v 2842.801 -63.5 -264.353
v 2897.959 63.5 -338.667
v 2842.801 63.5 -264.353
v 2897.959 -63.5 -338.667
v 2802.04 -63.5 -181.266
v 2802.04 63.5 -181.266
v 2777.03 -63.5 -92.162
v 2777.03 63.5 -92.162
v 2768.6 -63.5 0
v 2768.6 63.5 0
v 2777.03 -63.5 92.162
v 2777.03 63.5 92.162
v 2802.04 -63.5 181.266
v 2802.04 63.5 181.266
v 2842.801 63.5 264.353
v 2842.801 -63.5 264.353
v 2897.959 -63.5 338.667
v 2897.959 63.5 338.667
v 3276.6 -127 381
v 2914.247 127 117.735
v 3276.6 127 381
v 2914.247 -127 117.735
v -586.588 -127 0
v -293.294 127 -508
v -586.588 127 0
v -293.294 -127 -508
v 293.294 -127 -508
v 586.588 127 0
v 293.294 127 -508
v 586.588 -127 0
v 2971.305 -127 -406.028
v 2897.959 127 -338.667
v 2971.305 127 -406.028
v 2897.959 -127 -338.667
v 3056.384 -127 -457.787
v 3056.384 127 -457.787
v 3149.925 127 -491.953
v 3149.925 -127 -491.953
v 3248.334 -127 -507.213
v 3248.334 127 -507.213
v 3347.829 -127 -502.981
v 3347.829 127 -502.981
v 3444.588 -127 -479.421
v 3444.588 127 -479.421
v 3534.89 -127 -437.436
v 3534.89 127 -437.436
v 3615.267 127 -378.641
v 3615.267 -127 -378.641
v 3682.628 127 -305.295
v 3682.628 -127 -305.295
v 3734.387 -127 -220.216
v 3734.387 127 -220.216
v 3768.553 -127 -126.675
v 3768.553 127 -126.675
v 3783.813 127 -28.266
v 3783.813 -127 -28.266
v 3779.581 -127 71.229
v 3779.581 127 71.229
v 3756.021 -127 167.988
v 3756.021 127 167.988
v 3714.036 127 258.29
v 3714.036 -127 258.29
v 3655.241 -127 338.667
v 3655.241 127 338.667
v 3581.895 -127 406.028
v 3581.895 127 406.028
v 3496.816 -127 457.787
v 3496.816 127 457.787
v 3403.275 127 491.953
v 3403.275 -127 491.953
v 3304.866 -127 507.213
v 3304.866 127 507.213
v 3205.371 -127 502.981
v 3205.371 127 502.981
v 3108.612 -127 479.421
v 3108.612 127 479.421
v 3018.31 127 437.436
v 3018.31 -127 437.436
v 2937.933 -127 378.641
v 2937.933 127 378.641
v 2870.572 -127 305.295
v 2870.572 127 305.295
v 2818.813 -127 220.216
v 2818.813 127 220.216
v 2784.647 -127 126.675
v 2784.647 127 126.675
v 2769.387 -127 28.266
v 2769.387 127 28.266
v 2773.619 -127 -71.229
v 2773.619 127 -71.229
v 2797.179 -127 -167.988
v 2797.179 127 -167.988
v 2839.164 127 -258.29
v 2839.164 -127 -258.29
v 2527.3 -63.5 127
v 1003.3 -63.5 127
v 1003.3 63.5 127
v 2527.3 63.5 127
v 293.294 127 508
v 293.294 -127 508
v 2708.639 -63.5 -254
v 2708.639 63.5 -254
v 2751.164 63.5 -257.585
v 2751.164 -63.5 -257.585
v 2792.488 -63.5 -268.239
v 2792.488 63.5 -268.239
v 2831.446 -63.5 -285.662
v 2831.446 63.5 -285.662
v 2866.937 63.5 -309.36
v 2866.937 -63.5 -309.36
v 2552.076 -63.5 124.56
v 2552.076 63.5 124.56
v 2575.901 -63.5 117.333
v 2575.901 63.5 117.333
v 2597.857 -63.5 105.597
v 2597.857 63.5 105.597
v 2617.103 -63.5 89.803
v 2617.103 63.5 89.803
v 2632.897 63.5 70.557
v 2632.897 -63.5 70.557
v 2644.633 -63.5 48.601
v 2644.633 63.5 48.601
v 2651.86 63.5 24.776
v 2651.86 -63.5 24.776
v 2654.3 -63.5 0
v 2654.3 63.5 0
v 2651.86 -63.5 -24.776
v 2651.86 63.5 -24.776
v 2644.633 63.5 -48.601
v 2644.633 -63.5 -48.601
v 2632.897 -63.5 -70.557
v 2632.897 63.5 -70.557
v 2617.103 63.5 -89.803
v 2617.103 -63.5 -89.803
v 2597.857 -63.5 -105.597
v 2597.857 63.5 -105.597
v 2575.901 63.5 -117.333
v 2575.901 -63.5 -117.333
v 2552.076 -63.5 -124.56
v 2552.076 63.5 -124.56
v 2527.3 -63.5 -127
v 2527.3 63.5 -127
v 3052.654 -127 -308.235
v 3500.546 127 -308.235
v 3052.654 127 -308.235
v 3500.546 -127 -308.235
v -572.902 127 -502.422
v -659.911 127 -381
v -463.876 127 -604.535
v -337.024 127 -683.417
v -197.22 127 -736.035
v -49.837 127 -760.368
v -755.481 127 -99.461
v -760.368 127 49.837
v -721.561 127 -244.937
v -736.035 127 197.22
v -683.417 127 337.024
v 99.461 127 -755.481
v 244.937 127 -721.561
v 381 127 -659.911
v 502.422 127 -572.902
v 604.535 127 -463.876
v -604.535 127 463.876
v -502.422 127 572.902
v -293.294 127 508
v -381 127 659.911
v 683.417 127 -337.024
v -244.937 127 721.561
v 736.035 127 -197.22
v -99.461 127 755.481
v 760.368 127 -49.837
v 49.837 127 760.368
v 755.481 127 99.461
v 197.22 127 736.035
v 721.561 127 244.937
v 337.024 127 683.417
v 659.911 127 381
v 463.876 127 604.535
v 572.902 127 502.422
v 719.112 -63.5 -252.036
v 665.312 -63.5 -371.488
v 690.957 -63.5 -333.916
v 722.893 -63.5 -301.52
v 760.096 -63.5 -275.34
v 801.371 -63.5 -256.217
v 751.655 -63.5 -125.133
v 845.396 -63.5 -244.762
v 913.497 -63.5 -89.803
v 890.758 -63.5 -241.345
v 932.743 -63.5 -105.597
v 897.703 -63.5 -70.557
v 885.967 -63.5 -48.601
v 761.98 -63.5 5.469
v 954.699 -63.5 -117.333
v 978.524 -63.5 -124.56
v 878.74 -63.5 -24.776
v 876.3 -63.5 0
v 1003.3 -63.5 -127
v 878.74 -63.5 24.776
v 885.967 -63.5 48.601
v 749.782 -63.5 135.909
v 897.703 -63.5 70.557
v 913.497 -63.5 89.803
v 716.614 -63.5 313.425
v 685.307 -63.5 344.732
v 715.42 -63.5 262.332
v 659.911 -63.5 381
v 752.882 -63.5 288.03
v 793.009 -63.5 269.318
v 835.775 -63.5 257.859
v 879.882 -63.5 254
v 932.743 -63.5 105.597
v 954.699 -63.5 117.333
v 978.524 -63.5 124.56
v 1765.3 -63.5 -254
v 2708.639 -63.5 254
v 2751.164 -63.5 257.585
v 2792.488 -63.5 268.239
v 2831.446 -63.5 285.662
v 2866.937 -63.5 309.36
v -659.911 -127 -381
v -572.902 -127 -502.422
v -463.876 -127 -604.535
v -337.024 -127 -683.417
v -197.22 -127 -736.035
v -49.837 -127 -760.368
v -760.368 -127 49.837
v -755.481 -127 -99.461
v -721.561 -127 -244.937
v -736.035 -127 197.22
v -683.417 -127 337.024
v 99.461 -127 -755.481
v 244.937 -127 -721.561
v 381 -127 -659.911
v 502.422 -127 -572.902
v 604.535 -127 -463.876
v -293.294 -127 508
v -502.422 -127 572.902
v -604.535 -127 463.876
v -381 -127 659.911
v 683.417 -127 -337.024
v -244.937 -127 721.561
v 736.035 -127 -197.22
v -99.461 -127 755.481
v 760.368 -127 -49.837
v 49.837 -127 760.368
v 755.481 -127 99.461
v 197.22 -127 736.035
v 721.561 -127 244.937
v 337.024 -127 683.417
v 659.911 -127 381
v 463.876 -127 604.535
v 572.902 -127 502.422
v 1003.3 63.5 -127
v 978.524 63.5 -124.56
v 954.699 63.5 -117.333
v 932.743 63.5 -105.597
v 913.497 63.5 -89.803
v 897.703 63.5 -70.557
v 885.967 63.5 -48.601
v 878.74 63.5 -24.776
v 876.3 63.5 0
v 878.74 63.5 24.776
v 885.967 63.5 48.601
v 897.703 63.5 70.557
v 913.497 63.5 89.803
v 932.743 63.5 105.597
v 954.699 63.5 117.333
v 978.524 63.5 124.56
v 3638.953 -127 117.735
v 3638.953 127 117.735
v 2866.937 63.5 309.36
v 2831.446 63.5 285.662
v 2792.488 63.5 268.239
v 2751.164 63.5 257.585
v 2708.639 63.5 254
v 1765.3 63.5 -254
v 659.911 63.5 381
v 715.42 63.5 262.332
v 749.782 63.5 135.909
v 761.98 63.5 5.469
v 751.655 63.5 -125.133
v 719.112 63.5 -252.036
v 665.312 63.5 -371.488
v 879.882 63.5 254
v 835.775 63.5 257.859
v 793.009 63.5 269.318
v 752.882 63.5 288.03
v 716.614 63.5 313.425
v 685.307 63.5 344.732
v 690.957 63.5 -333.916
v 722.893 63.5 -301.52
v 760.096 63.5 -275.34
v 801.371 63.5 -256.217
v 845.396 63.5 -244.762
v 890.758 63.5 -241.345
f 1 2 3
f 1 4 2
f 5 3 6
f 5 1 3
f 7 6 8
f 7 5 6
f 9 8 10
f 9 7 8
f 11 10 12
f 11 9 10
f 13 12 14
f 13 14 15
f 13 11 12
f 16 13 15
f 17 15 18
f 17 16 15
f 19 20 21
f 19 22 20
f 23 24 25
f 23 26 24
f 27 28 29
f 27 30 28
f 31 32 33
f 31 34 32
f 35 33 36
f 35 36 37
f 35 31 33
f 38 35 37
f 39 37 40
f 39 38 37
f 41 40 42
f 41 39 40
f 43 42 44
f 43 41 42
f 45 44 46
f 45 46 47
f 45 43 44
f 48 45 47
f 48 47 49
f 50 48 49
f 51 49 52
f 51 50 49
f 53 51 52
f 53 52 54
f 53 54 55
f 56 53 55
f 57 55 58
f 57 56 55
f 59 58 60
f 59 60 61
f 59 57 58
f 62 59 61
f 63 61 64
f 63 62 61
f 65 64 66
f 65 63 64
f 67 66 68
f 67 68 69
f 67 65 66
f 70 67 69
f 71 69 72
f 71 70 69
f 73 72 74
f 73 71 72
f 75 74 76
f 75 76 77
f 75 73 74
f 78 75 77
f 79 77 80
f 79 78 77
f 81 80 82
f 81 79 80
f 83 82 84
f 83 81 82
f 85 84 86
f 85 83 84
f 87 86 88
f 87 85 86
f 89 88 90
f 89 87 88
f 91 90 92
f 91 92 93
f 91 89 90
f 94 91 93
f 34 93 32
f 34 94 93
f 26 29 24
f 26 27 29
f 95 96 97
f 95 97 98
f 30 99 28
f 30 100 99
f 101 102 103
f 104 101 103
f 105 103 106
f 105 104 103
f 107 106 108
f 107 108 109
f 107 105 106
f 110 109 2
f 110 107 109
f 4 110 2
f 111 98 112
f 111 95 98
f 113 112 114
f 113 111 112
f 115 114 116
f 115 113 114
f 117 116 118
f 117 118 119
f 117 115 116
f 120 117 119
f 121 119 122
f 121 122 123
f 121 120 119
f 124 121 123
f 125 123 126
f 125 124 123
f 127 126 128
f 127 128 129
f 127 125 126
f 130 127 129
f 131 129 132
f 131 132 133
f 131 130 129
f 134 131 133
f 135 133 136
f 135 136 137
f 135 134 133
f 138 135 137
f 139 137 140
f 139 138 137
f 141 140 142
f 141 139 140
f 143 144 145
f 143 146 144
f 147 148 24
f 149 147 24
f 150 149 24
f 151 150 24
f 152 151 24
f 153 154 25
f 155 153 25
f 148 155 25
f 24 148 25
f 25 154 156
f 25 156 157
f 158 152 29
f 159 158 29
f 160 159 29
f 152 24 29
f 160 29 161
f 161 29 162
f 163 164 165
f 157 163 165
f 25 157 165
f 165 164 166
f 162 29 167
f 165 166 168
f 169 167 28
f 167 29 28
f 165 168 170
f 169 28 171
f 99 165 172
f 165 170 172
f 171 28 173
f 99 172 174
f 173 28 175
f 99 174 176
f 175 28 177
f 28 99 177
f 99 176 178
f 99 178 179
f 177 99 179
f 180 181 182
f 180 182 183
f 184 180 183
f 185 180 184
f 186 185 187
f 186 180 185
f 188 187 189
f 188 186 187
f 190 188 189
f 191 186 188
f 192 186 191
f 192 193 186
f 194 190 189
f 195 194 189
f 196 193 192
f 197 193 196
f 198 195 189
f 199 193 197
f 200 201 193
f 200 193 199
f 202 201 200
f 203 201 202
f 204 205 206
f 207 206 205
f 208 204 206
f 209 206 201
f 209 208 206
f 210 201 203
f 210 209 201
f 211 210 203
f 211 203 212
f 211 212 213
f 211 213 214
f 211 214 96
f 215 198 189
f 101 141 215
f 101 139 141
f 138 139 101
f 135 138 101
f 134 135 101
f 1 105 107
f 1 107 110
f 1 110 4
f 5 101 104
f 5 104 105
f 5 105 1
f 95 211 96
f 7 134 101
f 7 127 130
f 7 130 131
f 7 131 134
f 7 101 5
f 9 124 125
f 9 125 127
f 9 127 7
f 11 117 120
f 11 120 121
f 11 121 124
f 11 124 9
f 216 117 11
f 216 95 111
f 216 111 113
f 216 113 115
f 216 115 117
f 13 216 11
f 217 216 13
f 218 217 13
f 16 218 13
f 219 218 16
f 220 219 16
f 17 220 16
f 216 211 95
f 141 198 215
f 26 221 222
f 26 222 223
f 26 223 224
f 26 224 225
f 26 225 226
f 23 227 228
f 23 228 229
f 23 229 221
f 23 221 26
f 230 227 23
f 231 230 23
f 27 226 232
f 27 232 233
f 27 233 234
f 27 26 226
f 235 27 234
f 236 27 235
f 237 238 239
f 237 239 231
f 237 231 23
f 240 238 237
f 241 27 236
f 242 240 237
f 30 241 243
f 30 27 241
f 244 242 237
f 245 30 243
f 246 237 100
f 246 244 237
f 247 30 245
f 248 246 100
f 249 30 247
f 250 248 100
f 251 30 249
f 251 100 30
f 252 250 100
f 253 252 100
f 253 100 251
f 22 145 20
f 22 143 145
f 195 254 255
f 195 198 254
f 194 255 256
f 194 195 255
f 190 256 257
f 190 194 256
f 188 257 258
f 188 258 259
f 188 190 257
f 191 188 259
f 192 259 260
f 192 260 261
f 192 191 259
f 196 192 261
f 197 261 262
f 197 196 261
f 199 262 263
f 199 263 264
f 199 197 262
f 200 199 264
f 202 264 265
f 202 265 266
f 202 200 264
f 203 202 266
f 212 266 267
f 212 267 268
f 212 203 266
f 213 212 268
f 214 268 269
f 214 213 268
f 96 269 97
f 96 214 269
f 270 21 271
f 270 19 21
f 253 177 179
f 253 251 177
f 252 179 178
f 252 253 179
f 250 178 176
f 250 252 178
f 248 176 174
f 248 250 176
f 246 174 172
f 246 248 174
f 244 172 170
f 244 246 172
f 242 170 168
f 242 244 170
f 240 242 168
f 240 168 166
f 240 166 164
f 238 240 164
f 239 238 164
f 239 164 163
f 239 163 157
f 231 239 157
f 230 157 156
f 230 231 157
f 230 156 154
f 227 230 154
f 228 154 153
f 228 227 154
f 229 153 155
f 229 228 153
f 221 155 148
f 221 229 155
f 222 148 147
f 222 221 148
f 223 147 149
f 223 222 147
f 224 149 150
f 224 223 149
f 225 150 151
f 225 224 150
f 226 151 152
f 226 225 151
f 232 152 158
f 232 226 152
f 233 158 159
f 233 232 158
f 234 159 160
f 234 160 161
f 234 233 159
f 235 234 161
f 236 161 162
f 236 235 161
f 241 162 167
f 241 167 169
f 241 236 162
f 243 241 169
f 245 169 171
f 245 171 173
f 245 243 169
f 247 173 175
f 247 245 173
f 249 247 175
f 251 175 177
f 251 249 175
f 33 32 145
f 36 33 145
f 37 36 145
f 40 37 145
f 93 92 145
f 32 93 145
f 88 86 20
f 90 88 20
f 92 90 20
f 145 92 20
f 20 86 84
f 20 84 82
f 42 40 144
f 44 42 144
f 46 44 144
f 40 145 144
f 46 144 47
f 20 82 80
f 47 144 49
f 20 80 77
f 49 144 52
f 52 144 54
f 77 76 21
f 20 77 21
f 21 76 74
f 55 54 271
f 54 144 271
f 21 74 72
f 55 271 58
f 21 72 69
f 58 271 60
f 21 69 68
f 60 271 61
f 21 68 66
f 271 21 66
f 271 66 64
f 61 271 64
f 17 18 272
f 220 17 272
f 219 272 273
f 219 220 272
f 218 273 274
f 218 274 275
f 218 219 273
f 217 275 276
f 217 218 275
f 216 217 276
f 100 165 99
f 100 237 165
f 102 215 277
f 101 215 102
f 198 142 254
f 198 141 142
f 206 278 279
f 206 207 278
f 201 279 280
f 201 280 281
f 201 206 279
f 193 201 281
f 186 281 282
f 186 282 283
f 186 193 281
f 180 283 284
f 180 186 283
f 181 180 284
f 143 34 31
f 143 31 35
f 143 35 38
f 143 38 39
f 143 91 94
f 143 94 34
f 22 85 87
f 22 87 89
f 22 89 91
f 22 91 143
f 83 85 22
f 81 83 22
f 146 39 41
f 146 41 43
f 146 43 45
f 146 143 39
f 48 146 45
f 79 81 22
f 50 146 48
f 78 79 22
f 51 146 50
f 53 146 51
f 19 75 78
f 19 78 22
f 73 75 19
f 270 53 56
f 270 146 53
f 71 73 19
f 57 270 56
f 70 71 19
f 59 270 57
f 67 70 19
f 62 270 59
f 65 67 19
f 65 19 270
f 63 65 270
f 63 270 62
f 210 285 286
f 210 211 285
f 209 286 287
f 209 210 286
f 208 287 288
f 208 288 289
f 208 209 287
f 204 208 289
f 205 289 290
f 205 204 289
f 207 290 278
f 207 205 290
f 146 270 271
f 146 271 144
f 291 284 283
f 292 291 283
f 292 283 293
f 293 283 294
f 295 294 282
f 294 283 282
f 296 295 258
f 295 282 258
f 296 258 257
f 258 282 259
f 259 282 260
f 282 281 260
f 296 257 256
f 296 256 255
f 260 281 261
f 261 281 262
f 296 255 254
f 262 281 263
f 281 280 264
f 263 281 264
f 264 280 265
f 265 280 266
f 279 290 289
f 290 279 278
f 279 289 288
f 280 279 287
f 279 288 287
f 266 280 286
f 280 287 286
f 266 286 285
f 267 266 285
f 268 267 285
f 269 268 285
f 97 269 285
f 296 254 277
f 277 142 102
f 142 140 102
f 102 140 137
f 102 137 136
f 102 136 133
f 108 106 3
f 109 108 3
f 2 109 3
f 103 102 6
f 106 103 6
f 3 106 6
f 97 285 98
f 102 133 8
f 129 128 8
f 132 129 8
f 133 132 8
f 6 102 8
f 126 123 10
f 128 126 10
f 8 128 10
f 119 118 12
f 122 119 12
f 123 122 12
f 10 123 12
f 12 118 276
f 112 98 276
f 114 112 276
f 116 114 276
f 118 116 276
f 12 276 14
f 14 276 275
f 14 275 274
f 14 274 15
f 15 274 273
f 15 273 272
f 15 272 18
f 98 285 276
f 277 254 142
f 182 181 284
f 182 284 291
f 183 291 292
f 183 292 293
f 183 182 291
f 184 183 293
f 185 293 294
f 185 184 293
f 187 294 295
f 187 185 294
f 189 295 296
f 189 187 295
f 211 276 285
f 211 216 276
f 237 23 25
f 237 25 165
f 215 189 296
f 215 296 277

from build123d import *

# Parameters (mm, degrees)
F1_DEPTH = 127
F2_DEPTH = 63.5


with BuildPart() as f1:
    # F0 (on Front) → F1 (new body, symmetric)
    with BuildSketch(Plane.XZ):
        with BuildLine():
            ThreePointArc((665.3121861086, -371.4884857105), (737.4319920558, -191.932428455), (762, 0))
            ThreePointArc((762, 0), (736.0354796323, 197.2201123681), (659.9113576837, 381))
            ThreePointArc((659.9113576837, 381), (-761.9803741154, -5.4689544648), (665.3121861086, -371.4884857105))
        make_face()
        Polygon((-586.5878734967, 0), (-293.2939367483, 508), (293.2939367483, 508), (586.5878734967, 0), (293.2939367483, -508), (-293.2939367483, -508), align=None, mode=Mode.SUBTRACT)
    extrude(amount=F1_DEPTH, both=True)


with BuildPart() as f1b:
    # F0 (on Front) → F1, piece 2 (new body, symmetric)
    with BuildSketch(Plane.XZ):
        with BuildLine():
            ThreePointArc((3784.6, 0), (3457.8656216047, 474.5595583531), (2897.95915581, 338.6666666667))
            ThreePointArc((2897.95915581, 338.6666666667), (2768.6, 0), (2897.95915581, -338.6666666667))
            ThreePointArc((2897.95915581, -338.6666666667), (3457.8656216047, -474.5595583531), (3784.6, 0))
        make_face()
        Polygon((3638.9525327085, 117.7354748569), (3500.5461811234, -308.2354748569), (3052.6538188766, -308.2354748569), (2914.2474672915, 117.7354748569), (3276.6, 381), align=None, mode=Mode.SUBTRACT)
    extrude(amount=F1_DEPTH, both=True)


with BuildPart() as f2:
    # F0 (on Front) → F2 (new body, symmetric)
    with BuildSketch(Plane.XZ):
        with BuildLine():
            ThreePointArc((659.9113576837, 381), (736.0354796323, 197.2201123681), (762, 0))
            ThreePointArc((762, 0), (737.4319920558, -191.932428455), (665.3121861086, -371.4884857105))
            ThreePointArc((665.3121861086, -371.4884857105), (760.0956270376, -275.3401894686), (890.7581446402, -241.3445715405))
            Line((890.7581446402, -241.3445715405), (1765.3, -254))
            Line((1765.3, -254), (2708.6387337151, -254))
            ThreePointArc((2708.6387337151, -254), (2812.3337994929, -276.1307839895), (2897.95915581, -338.6666666667))
            ThreePointArc((2897.95915581, -338.6666666667), (2768.6, 0), (2897.95915581, 338.6666666667))
            ThreePointArc((2897.95915581, 338.6666666667), (2812.3337994929, 276.1307839895), (2708.6387337151, 254))
            Line((2708.6387337151, 254), (1765.3, 254))
            Line((1765.3, 254), (879.881810245, 254))
            ThreePointArc((879.881810245, 254), (752.881810245, 288.0295474388), (659.9113576837, 381))
        make_face()
        with BuildLine():
            Line((1003.3, 127), (1765.3, 127))
            Line((1765.3, 127), (2527.3, 127))
            ThreePointArc((2527.3, 127), (2654.3, 0), (2527.3, -127))
            Line((2527.3, -127), (1003.3, -127))
            ThreePointArc((1003.3, -127), (876.3, 0), (1003.3, 127))
        make_face(mode=Mode.SUBTRACT)
    extrude(amount=F2_DEPTH, both=True)


solid = Compound([f1.part, f1b.part, f2.part])
